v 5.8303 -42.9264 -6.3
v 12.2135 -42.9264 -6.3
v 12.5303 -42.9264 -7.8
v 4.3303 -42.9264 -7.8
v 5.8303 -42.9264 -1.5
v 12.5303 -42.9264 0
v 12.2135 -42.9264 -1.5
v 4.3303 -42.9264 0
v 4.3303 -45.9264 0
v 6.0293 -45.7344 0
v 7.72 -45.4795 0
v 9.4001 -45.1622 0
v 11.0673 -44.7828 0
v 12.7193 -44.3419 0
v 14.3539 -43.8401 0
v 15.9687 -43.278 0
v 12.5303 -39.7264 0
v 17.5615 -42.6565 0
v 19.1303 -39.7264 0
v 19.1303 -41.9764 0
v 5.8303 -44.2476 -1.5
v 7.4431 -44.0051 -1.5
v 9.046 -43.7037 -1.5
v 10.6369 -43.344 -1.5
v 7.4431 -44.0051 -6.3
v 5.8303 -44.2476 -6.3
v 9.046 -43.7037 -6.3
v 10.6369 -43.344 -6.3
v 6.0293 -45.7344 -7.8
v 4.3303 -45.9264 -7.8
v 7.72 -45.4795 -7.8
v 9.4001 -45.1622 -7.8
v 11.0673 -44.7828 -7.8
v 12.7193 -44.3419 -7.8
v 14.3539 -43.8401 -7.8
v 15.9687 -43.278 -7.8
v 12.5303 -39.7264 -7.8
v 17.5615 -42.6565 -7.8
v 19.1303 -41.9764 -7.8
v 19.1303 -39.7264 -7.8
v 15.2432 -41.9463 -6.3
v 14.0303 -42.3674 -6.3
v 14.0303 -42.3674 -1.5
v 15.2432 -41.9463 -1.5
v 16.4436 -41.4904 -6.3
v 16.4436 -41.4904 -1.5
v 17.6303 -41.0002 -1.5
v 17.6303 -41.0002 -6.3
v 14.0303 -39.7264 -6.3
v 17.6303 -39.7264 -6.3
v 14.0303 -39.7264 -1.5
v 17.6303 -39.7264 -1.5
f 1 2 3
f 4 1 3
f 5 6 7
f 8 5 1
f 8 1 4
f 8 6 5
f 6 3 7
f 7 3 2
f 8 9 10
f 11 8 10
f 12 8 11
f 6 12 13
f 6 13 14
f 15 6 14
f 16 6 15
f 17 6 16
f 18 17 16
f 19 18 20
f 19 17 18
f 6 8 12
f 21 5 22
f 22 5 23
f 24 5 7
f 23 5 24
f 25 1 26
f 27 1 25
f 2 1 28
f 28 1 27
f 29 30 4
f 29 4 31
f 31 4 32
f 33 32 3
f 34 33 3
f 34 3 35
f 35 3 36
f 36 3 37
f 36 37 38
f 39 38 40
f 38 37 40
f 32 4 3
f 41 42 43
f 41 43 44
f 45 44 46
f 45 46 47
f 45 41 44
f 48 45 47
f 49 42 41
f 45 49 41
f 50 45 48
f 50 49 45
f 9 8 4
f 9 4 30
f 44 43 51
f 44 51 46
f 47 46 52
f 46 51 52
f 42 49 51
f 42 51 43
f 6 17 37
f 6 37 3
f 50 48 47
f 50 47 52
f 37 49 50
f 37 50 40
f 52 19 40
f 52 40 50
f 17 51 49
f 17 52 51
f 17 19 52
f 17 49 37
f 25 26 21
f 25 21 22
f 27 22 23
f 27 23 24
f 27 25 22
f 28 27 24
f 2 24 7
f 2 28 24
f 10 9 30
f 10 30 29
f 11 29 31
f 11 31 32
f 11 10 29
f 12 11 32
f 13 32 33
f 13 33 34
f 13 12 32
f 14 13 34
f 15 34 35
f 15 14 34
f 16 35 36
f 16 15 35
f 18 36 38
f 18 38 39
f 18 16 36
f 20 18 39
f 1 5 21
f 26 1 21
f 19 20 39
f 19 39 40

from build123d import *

# Parameters (mm, degrees)
BOSS_EXTRUDE1_DEPTH = 7.8
SHELL1_START        = -6.3
SHELL1_DEPTH        = 4.8


# Read off the part's stored shape, not the designer's step: Shell1
with BuildPart() as part:
    # Sketch1 → Boss-Extrude1 (new body)
    with BuildSketch(Plane.XY):
        with BuildLine():
            Line((19.130275644, -41.976412541), (19.130275644, -39.726412541))
            Line((19.130275644, -39.726412541), (12.530275644, -39.726412541))
            Line((12.530275644, -39.726412541), (12.530275644, -42.926412541))
            Line((12.530275644, -42.926412541), (4.330275644, -42.926412541))
            Line((4.330275644, -42.926412541), (4.330275644, -45.926412541))
            ThreePointArc((4.330275644, -45.926412541), (11.895376904, -44.570019793), (19.130275644, -41.976412541))
        make_face()
    extrude(amount=-BOSS_EXTRUDE1_DEPTH)

    # Shell1 outline → Shell1 (cut)
    with BuildSketch(Plane.XY.offset(SHELL1_START)):
        with BuildLine():
            Line((14.030275644, -39.726412541), (14.030275644, -42.367413234))
            ThreePointArc((14.030275644, -42.367413234), (15.845028157, -41.722672751), (17.630275644, -41.000240481))
            Line((17.630275644, -41.000240481), (17.630275644, -39.726412541))
            Line((17.630275644, -39.726412541), (14.030275644, -39.726412541))
        make_face()
        with BuildLine():
            Line((5.830275644, -42.926412541), (5.830275644, -44.247646544))
            ThreePointArc((5.830275644, -44.247646544), (9.046039137, -43.703724266), (12.213494388, -42.926412541))
            Line((12.213494388, -42.926412541), (5.830275644, -42.926412541))
        make_face()
    extrude(amount=SHELL1_DEPTH, mode=Mode.SUBTRACT)


solid = part.part
